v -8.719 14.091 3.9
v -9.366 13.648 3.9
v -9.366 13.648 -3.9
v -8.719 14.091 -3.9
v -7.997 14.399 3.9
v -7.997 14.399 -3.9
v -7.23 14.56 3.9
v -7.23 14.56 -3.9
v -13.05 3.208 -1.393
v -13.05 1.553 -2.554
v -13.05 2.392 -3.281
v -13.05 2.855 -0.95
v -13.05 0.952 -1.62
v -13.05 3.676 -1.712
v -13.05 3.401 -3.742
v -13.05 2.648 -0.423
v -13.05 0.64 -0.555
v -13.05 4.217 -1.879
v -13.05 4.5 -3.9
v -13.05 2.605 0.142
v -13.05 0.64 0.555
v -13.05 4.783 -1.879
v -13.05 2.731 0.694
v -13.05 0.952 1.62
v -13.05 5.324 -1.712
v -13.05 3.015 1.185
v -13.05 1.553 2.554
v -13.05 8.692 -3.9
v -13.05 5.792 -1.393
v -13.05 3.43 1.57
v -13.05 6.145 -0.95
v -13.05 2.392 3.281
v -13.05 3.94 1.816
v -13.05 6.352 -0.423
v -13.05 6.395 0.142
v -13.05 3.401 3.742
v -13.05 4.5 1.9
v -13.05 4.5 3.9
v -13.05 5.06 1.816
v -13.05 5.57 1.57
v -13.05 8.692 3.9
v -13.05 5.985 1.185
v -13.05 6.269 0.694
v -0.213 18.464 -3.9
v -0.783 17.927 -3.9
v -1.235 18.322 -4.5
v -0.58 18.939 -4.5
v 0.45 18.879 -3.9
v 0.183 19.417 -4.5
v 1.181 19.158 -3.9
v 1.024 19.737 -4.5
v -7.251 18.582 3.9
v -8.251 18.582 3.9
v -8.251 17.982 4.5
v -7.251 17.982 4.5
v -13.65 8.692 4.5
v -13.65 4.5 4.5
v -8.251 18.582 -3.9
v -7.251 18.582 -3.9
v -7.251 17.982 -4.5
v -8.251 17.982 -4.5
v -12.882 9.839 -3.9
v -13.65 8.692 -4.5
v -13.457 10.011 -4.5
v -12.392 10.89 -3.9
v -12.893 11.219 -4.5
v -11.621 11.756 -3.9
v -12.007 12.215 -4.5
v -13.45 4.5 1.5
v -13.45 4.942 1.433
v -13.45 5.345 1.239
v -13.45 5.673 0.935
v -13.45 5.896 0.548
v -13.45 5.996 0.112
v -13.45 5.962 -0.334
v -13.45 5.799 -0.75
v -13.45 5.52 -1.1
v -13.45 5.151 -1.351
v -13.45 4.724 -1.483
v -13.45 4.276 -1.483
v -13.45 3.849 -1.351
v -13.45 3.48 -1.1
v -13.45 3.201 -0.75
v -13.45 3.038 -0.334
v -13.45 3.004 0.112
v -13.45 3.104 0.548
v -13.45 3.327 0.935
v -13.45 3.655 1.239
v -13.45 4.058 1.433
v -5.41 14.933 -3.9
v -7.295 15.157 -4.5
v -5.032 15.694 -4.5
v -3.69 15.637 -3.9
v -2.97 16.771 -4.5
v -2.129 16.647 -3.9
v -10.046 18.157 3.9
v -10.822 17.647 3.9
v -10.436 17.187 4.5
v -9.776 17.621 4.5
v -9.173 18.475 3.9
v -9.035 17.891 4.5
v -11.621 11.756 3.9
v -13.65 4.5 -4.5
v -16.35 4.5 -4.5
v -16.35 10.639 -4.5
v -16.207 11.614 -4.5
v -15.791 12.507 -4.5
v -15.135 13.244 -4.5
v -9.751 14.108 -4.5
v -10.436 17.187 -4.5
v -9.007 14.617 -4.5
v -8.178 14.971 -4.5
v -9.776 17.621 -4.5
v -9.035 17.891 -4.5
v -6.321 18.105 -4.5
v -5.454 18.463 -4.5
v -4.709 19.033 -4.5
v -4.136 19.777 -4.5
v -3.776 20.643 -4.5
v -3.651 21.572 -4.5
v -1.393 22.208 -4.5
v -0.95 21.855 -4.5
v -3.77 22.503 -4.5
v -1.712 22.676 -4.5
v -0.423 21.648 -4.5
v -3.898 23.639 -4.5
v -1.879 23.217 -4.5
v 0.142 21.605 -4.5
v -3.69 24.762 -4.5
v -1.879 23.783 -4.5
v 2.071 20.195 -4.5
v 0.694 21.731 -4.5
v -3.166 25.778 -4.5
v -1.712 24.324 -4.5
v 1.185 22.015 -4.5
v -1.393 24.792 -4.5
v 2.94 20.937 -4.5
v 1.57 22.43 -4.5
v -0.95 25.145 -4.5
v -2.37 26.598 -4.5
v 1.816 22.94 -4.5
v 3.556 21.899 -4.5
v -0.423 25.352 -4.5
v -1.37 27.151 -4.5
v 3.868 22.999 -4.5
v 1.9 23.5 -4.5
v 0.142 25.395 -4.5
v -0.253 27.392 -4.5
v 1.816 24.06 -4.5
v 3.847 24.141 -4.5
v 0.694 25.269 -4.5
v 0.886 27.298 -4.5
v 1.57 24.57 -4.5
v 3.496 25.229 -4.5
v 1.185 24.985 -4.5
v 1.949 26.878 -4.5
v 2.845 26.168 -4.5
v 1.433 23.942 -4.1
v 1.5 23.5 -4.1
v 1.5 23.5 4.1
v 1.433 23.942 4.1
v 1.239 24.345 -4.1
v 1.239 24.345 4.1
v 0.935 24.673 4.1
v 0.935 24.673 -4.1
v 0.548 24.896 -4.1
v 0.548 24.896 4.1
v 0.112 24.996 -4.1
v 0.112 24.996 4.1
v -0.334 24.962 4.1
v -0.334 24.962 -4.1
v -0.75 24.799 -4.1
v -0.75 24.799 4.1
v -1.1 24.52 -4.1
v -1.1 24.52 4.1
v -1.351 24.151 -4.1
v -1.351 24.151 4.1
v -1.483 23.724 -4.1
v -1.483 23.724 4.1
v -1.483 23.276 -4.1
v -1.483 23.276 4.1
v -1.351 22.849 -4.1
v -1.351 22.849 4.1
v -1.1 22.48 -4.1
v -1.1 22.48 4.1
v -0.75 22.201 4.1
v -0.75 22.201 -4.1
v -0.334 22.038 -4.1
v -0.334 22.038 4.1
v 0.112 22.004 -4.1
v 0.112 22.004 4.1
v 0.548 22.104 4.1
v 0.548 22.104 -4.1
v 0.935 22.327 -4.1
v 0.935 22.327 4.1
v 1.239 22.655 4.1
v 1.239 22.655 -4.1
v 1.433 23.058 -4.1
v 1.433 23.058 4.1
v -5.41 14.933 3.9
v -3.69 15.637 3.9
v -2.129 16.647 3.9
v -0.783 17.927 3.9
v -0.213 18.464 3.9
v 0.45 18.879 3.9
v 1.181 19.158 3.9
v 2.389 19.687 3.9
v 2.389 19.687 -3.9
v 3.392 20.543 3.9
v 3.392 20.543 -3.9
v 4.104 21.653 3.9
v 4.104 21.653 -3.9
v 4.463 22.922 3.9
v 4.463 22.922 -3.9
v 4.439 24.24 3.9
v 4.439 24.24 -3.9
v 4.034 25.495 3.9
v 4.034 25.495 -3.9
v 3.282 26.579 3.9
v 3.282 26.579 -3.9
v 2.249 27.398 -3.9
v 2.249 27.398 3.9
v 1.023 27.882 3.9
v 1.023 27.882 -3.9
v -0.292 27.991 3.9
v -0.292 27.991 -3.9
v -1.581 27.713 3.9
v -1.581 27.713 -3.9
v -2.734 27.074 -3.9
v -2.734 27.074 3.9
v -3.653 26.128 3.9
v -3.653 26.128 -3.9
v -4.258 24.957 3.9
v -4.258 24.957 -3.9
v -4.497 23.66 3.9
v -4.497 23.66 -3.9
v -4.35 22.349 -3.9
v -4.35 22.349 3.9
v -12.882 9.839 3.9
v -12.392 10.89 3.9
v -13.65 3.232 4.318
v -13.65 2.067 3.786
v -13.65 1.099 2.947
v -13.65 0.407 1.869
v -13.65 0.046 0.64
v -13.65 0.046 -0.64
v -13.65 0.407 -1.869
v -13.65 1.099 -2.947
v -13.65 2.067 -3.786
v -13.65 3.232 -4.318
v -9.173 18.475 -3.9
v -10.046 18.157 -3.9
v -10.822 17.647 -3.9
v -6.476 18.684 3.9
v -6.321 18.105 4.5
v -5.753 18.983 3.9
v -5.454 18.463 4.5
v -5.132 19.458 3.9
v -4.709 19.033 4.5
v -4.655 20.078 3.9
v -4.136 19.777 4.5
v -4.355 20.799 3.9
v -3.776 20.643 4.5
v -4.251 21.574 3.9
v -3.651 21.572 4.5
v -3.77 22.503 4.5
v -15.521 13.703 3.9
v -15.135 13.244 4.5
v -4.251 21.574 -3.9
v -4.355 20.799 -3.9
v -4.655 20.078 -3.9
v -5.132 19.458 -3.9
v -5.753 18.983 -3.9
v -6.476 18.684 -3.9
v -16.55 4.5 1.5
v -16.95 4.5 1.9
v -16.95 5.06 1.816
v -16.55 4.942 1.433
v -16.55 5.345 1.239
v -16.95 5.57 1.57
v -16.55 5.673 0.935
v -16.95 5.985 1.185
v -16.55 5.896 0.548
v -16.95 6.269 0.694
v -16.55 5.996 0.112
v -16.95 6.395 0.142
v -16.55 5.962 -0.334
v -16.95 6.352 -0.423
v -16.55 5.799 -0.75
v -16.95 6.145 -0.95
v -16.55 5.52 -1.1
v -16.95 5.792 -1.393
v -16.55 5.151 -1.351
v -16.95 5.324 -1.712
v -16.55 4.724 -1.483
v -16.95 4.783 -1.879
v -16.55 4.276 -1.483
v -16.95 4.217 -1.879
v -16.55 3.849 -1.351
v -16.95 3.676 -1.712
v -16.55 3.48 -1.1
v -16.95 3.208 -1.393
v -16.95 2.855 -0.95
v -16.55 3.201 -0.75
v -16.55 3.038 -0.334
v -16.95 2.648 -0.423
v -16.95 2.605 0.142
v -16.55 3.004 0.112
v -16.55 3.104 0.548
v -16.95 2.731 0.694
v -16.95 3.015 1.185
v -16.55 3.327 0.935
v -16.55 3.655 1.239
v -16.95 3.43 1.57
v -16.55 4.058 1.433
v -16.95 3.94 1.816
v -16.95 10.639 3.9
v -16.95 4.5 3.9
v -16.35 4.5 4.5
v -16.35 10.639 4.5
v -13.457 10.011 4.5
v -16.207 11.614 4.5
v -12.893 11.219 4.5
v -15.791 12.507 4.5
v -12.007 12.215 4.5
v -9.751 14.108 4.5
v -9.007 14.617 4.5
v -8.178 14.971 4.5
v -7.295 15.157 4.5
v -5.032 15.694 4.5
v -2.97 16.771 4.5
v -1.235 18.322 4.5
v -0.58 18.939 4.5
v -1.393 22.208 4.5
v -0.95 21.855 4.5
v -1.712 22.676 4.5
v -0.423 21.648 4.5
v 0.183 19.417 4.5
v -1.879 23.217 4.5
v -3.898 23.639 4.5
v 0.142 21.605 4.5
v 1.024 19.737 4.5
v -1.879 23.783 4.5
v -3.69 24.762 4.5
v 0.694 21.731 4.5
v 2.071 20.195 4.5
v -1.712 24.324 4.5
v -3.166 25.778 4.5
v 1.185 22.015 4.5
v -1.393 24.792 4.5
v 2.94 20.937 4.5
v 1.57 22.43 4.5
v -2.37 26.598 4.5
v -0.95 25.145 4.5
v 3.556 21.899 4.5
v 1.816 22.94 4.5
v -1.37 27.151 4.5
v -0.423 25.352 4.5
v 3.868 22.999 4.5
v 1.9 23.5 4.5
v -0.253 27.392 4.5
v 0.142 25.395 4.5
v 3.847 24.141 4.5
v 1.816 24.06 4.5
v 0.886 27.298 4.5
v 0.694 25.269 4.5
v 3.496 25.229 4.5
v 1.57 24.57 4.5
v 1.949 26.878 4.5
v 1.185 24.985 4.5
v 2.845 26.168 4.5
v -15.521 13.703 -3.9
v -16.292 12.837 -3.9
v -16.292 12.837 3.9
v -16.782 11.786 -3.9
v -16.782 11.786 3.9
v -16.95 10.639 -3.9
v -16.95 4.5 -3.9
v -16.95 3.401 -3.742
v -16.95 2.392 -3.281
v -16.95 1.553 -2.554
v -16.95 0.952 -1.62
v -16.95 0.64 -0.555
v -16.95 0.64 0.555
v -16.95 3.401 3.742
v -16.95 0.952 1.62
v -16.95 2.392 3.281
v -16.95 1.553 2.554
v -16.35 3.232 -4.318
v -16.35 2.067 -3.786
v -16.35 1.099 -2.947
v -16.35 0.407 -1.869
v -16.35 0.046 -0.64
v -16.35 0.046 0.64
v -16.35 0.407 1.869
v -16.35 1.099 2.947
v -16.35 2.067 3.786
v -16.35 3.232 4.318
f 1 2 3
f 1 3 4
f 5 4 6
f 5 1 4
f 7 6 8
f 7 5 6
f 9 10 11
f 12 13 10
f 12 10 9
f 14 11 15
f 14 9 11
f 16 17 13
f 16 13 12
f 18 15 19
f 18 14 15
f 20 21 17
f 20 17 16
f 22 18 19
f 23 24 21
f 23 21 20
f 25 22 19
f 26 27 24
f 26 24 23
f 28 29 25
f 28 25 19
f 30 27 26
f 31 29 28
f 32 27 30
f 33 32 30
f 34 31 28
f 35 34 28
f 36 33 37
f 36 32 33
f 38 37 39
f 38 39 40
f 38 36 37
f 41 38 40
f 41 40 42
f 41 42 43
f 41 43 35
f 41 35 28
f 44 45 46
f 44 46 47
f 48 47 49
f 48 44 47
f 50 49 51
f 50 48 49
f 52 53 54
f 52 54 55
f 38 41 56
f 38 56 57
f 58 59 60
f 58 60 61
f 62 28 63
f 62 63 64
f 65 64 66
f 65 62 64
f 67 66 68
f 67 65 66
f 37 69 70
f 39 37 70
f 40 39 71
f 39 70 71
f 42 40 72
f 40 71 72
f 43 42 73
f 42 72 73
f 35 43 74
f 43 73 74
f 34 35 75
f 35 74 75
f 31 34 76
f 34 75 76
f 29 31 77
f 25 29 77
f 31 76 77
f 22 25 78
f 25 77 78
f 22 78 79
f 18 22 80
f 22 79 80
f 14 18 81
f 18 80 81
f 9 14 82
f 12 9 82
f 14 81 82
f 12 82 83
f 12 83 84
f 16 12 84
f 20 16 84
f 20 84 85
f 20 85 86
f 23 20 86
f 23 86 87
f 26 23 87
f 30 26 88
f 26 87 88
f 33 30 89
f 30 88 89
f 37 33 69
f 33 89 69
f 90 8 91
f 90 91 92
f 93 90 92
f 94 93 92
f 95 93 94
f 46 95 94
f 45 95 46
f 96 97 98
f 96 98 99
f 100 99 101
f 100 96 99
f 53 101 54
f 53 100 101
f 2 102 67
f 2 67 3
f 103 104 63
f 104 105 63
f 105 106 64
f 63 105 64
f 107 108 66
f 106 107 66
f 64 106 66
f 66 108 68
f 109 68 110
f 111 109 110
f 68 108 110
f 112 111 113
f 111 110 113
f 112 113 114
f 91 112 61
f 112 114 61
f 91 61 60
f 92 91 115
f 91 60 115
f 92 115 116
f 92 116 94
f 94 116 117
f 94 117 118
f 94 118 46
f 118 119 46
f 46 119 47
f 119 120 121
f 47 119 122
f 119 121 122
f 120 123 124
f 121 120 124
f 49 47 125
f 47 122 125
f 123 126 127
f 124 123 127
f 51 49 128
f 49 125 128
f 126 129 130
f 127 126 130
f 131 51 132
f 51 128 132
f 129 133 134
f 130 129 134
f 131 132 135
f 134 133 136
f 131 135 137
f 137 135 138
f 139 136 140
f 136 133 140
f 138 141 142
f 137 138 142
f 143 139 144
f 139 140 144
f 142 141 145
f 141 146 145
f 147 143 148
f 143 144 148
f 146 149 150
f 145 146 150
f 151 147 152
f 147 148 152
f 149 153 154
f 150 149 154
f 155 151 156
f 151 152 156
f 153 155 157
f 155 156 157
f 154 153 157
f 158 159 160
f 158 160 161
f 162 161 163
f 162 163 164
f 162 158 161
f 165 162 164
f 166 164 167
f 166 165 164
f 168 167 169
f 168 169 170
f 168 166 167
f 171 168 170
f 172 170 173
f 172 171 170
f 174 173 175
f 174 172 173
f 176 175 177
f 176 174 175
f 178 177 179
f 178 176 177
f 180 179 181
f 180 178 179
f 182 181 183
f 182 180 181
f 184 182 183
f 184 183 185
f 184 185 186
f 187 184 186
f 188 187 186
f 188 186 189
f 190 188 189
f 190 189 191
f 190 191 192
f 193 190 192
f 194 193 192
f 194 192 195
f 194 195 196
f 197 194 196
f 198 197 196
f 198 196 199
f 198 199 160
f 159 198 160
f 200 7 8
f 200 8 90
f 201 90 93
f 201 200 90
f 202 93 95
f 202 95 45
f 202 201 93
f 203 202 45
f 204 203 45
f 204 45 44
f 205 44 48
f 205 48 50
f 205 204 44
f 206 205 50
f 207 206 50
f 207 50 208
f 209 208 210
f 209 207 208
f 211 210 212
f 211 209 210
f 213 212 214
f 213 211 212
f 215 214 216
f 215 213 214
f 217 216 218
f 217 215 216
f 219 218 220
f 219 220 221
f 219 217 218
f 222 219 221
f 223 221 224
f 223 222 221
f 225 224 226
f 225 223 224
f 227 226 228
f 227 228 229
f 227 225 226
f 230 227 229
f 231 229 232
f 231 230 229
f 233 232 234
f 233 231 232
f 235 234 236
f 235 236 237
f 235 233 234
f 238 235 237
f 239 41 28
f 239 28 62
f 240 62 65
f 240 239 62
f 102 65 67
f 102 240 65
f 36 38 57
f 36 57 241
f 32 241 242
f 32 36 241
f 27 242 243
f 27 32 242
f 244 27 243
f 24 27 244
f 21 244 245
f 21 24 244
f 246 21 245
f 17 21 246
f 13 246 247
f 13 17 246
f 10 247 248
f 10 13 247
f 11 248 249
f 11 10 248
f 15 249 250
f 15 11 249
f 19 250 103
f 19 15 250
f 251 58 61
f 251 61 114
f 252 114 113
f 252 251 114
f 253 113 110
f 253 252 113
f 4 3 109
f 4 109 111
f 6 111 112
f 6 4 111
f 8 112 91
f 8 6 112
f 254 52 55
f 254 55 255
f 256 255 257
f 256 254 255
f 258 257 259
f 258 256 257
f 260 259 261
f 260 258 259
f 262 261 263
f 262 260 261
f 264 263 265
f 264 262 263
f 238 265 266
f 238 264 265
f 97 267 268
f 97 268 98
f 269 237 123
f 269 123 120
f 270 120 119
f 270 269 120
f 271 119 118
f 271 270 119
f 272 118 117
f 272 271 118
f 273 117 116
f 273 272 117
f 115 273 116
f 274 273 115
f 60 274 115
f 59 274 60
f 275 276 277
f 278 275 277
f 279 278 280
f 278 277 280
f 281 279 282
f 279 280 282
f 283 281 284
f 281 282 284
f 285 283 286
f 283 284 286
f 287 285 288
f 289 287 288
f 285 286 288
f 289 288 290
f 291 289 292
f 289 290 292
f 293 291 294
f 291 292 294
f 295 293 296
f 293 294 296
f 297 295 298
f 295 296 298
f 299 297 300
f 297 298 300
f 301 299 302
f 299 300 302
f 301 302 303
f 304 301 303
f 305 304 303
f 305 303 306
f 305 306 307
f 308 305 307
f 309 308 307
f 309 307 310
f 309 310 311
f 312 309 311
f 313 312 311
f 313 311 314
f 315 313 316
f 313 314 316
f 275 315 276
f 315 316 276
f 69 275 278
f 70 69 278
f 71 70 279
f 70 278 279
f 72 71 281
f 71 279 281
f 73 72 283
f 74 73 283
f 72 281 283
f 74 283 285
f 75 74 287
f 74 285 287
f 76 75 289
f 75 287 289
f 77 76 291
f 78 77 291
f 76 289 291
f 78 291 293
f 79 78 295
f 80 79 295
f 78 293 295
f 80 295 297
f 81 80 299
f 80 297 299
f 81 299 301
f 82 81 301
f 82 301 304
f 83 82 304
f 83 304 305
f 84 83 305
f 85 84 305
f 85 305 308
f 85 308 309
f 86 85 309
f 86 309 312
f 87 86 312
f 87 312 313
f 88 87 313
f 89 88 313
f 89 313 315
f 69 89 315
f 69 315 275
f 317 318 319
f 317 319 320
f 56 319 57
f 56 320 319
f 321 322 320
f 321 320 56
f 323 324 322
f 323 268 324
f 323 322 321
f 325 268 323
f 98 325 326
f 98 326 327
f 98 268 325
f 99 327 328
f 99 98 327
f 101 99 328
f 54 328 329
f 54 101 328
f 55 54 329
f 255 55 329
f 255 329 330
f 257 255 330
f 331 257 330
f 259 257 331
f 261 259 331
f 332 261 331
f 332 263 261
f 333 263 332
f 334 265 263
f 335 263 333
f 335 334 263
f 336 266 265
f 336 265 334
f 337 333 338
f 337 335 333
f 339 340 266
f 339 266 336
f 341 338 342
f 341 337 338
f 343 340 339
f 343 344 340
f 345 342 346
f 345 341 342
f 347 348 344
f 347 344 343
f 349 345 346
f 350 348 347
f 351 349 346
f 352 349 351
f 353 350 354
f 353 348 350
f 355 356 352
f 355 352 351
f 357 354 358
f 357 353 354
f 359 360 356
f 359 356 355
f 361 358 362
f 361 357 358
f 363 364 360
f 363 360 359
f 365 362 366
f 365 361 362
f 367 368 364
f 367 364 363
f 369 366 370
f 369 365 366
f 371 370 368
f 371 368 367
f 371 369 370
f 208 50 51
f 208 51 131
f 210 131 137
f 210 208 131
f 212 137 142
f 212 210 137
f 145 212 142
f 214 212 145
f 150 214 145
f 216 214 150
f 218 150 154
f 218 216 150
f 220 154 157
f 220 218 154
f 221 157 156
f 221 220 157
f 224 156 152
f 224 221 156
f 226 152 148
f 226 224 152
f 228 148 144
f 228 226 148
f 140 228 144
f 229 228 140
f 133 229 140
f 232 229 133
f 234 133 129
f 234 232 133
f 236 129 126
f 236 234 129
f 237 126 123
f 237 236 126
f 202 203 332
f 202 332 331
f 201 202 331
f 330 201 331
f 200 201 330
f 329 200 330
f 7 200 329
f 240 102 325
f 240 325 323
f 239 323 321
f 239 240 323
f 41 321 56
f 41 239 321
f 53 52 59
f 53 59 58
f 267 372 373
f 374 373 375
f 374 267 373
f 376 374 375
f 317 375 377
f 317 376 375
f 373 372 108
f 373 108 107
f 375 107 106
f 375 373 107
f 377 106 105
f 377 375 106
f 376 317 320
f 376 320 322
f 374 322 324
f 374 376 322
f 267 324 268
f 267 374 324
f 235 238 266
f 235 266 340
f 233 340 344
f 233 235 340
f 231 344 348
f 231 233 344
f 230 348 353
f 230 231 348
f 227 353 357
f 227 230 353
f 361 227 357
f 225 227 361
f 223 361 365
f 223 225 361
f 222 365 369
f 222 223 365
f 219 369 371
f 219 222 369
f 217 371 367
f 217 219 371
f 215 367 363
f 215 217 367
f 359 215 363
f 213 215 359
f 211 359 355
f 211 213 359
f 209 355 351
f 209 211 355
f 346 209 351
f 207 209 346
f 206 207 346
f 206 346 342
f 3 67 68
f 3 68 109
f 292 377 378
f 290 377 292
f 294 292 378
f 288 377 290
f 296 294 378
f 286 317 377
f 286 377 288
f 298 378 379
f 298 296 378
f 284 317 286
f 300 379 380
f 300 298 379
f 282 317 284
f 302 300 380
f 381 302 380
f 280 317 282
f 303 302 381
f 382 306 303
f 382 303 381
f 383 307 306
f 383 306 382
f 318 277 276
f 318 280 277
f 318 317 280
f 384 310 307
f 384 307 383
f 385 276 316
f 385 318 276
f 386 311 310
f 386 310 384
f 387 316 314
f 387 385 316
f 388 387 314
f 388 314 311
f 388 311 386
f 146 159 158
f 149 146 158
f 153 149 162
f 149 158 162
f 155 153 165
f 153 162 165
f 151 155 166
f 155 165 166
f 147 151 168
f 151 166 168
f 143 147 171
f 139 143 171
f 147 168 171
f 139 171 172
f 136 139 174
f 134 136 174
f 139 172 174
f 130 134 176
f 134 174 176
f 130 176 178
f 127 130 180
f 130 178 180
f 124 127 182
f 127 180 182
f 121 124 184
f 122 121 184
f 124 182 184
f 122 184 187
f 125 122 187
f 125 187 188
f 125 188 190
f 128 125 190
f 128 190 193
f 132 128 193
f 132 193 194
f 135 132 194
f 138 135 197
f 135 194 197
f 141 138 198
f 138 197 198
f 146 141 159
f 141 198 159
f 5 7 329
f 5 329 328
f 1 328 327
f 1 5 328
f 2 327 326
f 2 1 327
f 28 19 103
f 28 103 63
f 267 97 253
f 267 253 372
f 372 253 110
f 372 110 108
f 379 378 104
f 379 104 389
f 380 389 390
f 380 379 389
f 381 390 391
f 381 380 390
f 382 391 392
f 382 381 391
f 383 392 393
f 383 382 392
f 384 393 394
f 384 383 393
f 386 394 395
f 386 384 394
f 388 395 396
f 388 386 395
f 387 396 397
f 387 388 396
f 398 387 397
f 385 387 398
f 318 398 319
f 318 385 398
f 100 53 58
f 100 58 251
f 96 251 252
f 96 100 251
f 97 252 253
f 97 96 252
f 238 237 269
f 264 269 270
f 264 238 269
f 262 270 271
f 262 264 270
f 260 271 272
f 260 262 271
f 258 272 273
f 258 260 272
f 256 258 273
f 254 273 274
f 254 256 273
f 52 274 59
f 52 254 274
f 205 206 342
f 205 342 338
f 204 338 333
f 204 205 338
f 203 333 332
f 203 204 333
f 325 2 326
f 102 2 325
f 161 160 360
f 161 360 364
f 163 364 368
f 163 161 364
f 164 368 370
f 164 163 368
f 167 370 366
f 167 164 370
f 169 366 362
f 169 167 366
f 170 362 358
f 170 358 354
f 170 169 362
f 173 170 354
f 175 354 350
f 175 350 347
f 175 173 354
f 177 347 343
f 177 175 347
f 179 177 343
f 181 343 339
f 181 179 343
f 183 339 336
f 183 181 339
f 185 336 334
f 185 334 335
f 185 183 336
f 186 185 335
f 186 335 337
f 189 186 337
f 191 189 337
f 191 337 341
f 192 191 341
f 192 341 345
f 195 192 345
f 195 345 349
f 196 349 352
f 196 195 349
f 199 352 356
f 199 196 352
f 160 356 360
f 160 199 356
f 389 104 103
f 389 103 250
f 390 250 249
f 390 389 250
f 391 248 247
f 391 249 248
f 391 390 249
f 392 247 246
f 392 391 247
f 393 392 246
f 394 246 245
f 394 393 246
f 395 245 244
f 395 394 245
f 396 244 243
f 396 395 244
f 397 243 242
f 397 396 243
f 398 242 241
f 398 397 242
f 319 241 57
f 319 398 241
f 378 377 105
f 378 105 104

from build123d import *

# Parameters (mm, degrees)
SKETCH1_R           = 1.5
BOSS_EXTRUDE1_DEPTH = 4.5
FILLET1_RADIUS      = 4.5
FILLET1_LENGTH      = 3.9
CUT_EXTRUDE1_REACH  = 37.558
SKETCH3_R           = 1.5
CHAMFER1_SIZE       = 0.6
CHAMFER2_SIZE       = 0.4


with BuildPart() as part:
    # Sketch1 → Boss-Extrude1 (new, symmetric)
    with BuildSketch(Plane.XY):
        with BuildLine():
            Line((-13.05, 0), (-13.05, 8.691684344))
            ThreePointArc((-13.05, 8.691684344), (-12.675231148, 10.382157391), (-11.621150439, 11.755862116))
            Line((-11.621150439, 11.755862116), (-9.365773473, 13.648348096))
            ThreePointArc((-9.365773473, 13.648348096), (-8.36559922, 14.262761606), (-7.230139126, 14.560390355))
            ThreePointArc((-7.230139126, 14.560390355), (-3.689610404, 15.637001914), (-0.783040807, 17.927479867))
            ThreePointArc((-0.783040807, 17.927479867), (0.108053117, 18.688045586), (1.181284206, 19.15781534))
            ThreePointArc((1.181284206, 19.15781534), (2.248897725, 27.397750508), (-4.350434235, 22.349468831))
            ThreePointArc((-4.350434235, 22.349468831), (-4.87363913, 19.752292641), (-7.250723724, 18.582448052))
            Line((-7.250723724, 18.582448052), (-8.250559688, 18.582448052))
            ThreePointArc((-8.250559688, 18.582448052), (-9.618640261, 18.341218535), (-10.821710127, 17.646625825))
            Line((-10.821710127, 17.646625825), (-15.521150439, 13.703327192))
            ThreePointArc((-15.521150439, 13.703327192), (-16.575231148, 12.329622467), (-16.95, 10.63914942))
            Line((-16.95, 10.63914942), (-16.95, 0))
            Line((-16.95, 0), (-13.05, 0))
        make_face()
        with Locations((0, 23.5)):
            Circle(SKETCH1_R, mode=Mode.SUBTRACT)
    extrude(amount=BOSS_EXTRUDE1_DEPTH, both=True)

    # Fillet1: full round fillet: the end face becomes a half cylinder, R = half its width
    fillet1_face = Plane((-15, 0, 0), x_dir=(-1, 0, 0), z_dir=(0, -1, 0))  # on the end face: x along it, z out of the body
    fillet1_slab = fillet1_face.offset(-FILLET1_RADIUS / 2) * Box(FILLET1_LENGTH, 2 * FILLET1_RADIUS, FILLET1_RADIUS, mode=Mode.PRIVATE)  # the body's end, R deep
    fillet1_round = Plane((-15, 4.5, 0), x_dir=(0, -1, 0), z_dir=(-1, 0, 0)) * Cylinder(FILLET1_RADIUS, FILLET1_LENGTH, mode=Mode.PRIVATE)  # its axis R under the face
    add(fillet1_slab - fillet1_round, mode=Mode.SUBTRACT)

    # Sketch3 → Cut-Extrude1 (cut, up to next)
    with BuildSketch(Plane.ZY.offset(16.95), mode=Mode.PRIVATE) as cut_extrude1_sk1:
        with Locations((0, 4.5)):
            Circle(SKETCH3_R)
    cut_extrude1_tool1 = extrude(cut_extrude1_sk1.sketch, amount=-CUT_EXTRUDE1_REACH, mode=Mode.PRIVATE) & part.part
    add(cut_extrude1_tool1.solids().sort_by_distance((-16.95, 4.5, 0))[0], mode=Mode.SUBTRACT)

    # Chamfer1
    chamfer1_edges = [part.edges().sort_by_distance(p)[0] for p in [
        (-13.171430283, 15.674976508, -4.5),
        (-9.618640261, 18.341218535, -4.5),
        (-7.750641706, 18.582448052, -4.5),
        (-4.87363913, 19.752292641, -4.5),
        (2.248897725, 27.397750508, -4.5),
        (0.108053117, 18.688045586, -4.5),
        (-3.689610404, 15.637001914, -4.5),
        (-8.36559922, 14.262761606, -4.5),
        (-10.493461956, 12.702105106, -4.5),
        (-12.675231148, 10.382157391, 4.5),
        (-12.675231148, 10.382157391, -4.5),
        (-16.95, 7.56957471, -4.5),
        (-16.575231148, 12.329622467, -4.5),
        (-10.493461956, 12.702105106, 4.5),
        (-8.36559922, 14.262761606, 4.5),
        (-3.689610404, 15.637001914, 4.5),
        (0.108053117, 18.688045586, 4.5),
        (2.248897725, 27.397750508, 4.5),
        (-4.87363913, 19.752292641, 4.5),
        (-7.750641706, 18.582448052, 4.5),
        (-16.575231148, 12.329622467, 4.5),
        (-9.618640261, 18.341218535, 4.5),
        (-13.171430283, 15.674976508, 4.5),
        (-13.05, 6.595842172, -4.5),
        (-13.05, 6.595842172, 4.5),
        (-13.05, 0, 0),
        (-16.95, 0, 0),
        (-16.95, 7.56957471, 4.5),
    ]]
    chamfer(chamfer1_edges, length=CHAMFER1_SIZE)

    # Chamfer2
    chamfer2_edges = [part.edges().sort_by_distance(p)[0] for p in [
        (-1.5, 23.5, -4.5),
        (-1.5, 23.5, 4.5),
        (-16.95, 4.5, -1.5),
        (-13.05, 4.5, -1.5),
    ]]
    chamfer(chamfer2_edges, length=CHAMFER2_SIZE)


solid = part.part
